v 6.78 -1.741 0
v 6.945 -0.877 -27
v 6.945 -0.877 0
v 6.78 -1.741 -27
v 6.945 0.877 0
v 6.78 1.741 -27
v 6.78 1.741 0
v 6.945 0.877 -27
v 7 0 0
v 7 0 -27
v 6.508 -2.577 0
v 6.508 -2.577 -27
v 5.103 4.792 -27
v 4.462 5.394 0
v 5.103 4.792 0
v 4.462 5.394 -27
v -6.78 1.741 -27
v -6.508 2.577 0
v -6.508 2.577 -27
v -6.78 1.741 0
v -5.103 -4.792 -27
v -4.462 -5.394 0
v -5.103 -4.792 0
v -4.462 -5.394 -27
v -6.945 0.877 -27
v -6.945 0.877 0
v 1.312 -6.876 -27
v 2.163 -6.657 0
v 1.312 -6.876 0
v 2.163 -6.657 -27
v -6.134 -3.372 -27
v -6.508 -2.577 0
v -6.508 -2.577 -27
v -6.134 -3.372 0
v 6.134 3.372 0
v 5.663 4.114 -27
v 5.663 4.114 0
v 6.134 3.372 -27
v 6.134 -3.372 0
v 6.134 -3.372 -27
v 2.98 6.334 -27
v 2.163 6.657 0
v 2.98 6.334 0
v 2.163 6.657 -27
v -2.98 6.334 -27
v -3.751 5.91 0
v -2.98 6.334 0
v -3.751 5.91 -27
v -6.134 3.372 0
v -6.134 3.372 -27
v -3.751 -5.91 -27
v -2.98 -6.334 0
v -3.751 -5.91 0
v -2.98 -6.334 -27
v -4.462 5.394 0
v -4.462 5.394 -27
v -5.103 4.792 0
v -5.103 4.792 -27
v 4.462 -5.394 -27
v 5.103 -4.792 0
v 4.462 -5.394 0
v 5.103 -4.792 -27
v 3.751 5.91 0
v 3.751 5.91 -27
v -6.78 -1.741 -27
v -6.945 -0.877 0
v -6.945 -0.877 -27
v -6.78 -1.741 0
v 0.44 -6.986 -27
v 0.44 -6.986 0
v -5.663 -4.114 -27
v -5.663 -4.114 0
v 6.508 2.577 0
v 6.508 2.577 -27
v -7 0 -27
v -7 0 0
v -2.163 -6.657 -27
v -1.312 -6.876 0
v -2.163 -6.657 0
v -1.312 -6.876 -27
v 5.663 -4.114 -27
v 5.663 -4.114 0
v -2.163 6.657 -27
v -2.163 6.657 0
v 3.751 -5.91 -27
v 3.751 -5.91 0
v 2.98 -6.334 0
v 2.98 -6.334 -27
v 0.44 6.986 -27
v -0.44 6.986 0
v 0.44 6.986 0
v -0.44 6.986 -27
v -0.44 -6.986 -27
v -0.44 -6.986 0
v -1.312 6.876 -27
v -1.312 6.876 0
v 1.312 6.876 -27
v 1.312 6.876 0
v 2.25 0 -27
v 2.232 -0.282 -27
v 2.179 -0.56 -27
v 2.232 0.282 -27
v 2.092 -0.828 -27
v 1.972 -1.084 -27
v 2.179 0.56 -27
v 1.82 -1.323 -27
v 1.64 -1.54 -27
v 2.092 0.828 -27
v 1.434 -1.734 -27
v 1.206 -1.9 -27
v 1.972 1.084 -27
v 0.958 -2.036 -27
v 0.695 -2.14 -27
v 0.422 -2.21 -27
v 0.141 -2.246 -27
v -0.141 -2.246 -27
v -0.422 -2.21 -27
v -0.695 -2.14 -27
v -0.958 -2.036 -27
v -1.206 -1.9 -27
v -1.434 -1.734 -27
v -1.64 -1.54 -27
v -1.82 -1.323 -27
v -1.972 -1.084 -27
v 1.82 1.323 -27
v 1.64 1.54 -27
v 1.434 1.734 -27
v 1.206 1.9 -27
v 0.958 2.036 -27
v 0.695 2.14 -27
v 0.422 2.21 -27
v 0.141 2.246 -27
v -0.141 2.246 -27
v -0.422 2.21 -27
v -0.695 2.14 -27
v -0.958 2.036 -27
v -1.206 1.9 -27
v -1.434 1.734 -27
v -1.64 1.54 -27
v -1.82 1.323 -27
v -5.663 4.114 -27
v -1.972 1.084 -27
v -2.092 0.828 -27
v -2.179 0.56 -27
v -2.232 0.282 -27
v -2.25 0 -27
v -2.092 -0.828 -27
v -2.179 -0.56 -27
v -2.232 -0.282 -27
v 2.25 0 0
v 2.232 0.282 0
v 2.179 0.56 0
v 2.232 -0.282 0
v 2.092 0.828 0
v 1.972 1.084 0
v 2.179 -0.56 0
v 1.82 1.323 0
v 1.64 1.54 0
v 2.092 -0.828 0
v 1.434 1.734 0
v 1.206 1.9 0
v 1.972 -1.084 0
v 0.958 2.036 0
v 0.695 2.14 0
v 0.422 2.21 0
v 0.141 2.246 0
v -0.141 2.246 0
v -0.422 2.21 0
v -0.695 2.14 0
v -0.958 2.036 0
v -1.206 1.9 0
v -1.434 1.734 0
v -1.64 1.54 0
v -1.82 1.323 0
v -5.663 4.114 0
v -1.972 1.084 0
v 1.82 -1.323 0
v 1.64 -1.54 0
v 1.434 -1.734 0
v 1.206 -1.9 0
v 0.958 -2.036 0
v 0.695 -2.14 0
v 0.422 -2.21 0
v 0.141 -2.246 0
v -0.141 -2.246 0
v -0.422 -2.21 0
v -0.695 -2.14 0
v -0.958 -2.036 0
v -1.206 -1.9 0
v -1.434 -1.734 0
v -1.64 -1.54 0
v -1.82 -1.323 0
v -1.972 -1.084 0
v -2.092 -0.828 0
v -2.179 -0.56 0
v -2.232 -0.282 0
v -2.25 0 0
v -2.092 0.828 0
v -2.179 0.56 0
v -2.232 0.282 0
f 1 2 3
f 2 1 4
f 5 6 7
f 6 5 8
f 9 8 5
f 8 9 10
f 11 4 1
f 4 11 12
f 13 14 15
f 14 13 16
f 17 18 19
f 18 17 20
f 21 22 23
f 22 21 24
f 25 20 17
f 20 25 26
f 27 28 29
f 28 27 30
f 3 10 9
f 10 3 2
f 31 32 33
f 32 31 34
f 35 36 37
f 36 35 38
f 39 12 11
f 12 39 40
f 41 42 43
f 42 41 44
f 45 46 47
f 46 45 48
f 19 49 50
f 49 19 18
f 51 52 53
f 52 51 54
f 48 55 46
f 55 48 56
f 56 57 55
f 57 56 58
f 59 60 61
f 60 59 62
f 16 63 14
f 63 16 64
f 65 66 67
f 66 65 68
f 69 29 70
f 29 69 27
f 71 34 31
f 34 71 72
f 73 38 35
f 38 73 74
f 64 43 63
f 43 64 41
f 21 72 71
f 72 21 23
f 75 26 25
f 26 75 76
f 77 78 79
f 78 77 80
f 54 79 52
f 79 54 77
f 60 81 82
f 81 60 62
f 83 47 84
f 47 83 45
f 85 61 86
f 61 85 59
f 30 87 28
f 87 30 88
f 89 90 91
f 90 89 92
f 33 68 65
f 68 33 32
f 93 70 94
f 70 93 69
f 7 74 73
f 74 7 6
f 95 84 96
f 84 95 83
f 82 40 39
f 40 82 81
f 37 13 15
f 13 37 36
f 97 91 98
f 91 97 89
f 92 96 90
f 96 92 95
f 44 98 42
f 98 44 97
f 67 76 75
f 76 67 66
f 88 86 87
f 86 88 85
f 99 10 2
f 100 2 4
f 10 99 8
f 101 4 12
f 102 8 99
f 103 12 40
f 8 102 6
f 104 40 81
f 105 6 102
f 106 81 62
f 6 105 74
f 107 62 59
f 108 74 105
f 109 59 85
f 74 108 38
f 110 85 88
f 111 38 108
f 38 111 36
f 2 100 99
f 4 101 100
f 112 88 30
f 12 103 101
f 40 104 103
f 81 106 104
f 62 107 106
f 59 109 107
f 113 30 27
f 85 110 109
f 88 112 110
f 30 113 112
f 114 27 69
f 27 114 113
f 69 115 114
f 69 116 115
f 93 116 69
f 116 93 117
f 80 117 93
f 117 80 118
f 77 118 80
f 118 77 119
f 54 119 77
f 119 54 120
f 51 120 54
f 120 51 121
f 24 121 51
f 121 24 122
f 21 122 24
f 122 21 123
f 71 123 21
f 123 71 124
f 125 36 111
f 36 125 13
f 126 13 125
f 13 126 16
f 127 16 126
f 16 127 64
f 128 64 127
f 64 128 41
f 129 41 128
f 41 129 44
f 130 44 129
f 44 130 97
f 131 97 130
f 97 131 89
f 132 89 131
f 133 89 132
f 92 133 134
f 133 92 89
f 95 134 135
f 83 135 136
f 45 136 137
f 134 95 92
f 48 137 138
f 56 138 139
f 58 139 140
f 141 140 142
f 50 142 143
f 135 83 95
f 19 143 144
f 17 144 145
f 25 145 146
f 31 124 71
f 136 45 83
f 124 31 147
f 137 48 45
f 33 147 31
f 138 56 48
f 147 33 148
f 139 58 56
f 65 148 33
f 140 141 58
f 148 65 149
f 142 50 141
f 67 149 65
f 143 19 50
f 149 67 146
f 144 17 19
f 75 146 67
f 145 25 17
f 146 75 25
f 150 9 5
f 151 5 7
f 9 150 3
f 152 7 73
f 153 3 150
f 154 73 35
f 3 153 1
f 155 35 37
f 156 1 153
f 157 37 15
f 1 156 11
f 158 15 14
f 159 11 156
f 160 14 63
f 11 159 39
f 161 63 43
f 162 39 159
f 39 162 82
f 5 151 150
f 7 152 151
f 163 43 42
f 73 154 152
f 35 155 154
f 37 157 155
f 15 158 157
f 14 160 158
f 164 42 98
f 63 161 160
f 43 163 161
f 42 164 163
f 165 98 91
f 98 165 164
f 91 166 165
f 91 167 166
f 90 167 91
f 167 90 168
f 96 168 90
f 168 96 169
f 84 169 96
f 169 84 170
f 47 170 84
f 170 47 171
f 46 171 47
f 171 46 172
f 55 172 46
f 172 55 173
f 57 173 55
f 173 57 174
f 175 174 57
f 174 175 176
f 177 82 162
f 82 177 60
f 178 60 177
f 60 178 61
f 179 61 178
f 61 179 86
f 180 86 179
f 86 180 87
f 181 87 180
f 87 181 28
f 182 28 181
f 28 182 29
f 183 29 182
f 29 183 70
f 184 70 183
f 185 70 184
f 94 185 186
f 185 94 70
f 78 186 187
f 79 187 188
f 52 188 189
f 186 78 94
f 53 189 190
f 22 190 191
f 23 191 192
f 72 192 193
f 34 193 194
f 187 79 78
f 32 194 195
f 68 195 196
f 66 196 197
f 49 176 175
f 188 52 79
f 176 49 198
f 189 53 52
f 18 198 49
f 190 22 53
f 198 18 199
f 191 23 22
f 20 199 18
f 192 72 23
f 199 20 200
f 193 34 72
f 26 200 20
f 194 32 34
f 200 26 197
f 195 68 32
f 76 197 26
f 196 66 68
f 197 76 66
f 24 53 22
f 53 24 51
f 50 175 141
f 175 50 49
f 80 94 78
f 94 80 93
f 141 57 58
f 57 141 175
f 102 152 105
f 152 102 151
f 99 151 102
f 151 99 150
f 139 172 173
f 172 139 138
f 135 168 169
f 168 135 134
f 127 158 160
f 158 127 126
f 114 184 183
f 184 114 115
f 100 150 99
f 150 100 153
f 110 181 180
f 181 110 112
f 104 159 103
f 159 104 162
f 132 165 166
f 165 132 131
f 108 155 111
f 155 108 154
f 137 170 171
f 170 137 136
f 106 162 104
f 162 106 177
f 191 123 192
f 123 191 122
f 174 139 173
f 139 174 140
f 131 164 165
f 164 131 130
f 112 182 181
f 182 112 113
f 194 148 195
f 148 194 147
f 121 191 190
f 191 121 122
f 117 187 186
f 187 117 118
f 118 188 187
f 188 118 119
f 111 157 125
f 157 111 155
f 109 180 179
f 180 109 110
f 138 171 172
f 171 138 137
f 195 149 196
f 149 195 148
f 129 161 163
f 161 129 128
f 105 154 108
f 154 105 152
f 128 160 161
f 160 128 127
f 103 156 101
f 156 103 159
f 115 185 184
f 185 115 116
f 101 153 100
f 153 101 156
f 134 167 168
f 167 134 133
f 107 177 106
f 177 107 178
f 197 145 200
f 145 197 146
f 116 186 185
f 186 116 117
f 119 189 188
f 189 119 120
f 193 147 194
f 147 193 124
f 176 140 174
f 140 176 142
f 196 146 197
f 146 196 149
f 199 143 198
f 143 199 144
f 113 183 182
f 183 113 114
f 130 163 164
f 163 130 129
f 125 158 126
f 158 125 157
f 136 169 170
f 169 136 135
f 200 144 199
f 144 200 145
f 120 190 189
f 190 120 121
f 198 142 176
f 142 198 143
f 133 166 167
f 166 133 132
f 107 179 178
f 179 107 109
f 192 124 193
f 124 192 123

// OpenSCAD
$fn = 50;


difference() {
	union() {
		translate(v = [0, 0, -27.0000000000]) {
			cylinder(h = 27, r = 7.0000000000);
		}
		cylinder(h = 0, r = 16.0000000000);
	}
	union() {
		#translate(v = [0, 0, -27]) {
			cylinder(h = 27, r = 2.2500000000);
		}
	}
}
